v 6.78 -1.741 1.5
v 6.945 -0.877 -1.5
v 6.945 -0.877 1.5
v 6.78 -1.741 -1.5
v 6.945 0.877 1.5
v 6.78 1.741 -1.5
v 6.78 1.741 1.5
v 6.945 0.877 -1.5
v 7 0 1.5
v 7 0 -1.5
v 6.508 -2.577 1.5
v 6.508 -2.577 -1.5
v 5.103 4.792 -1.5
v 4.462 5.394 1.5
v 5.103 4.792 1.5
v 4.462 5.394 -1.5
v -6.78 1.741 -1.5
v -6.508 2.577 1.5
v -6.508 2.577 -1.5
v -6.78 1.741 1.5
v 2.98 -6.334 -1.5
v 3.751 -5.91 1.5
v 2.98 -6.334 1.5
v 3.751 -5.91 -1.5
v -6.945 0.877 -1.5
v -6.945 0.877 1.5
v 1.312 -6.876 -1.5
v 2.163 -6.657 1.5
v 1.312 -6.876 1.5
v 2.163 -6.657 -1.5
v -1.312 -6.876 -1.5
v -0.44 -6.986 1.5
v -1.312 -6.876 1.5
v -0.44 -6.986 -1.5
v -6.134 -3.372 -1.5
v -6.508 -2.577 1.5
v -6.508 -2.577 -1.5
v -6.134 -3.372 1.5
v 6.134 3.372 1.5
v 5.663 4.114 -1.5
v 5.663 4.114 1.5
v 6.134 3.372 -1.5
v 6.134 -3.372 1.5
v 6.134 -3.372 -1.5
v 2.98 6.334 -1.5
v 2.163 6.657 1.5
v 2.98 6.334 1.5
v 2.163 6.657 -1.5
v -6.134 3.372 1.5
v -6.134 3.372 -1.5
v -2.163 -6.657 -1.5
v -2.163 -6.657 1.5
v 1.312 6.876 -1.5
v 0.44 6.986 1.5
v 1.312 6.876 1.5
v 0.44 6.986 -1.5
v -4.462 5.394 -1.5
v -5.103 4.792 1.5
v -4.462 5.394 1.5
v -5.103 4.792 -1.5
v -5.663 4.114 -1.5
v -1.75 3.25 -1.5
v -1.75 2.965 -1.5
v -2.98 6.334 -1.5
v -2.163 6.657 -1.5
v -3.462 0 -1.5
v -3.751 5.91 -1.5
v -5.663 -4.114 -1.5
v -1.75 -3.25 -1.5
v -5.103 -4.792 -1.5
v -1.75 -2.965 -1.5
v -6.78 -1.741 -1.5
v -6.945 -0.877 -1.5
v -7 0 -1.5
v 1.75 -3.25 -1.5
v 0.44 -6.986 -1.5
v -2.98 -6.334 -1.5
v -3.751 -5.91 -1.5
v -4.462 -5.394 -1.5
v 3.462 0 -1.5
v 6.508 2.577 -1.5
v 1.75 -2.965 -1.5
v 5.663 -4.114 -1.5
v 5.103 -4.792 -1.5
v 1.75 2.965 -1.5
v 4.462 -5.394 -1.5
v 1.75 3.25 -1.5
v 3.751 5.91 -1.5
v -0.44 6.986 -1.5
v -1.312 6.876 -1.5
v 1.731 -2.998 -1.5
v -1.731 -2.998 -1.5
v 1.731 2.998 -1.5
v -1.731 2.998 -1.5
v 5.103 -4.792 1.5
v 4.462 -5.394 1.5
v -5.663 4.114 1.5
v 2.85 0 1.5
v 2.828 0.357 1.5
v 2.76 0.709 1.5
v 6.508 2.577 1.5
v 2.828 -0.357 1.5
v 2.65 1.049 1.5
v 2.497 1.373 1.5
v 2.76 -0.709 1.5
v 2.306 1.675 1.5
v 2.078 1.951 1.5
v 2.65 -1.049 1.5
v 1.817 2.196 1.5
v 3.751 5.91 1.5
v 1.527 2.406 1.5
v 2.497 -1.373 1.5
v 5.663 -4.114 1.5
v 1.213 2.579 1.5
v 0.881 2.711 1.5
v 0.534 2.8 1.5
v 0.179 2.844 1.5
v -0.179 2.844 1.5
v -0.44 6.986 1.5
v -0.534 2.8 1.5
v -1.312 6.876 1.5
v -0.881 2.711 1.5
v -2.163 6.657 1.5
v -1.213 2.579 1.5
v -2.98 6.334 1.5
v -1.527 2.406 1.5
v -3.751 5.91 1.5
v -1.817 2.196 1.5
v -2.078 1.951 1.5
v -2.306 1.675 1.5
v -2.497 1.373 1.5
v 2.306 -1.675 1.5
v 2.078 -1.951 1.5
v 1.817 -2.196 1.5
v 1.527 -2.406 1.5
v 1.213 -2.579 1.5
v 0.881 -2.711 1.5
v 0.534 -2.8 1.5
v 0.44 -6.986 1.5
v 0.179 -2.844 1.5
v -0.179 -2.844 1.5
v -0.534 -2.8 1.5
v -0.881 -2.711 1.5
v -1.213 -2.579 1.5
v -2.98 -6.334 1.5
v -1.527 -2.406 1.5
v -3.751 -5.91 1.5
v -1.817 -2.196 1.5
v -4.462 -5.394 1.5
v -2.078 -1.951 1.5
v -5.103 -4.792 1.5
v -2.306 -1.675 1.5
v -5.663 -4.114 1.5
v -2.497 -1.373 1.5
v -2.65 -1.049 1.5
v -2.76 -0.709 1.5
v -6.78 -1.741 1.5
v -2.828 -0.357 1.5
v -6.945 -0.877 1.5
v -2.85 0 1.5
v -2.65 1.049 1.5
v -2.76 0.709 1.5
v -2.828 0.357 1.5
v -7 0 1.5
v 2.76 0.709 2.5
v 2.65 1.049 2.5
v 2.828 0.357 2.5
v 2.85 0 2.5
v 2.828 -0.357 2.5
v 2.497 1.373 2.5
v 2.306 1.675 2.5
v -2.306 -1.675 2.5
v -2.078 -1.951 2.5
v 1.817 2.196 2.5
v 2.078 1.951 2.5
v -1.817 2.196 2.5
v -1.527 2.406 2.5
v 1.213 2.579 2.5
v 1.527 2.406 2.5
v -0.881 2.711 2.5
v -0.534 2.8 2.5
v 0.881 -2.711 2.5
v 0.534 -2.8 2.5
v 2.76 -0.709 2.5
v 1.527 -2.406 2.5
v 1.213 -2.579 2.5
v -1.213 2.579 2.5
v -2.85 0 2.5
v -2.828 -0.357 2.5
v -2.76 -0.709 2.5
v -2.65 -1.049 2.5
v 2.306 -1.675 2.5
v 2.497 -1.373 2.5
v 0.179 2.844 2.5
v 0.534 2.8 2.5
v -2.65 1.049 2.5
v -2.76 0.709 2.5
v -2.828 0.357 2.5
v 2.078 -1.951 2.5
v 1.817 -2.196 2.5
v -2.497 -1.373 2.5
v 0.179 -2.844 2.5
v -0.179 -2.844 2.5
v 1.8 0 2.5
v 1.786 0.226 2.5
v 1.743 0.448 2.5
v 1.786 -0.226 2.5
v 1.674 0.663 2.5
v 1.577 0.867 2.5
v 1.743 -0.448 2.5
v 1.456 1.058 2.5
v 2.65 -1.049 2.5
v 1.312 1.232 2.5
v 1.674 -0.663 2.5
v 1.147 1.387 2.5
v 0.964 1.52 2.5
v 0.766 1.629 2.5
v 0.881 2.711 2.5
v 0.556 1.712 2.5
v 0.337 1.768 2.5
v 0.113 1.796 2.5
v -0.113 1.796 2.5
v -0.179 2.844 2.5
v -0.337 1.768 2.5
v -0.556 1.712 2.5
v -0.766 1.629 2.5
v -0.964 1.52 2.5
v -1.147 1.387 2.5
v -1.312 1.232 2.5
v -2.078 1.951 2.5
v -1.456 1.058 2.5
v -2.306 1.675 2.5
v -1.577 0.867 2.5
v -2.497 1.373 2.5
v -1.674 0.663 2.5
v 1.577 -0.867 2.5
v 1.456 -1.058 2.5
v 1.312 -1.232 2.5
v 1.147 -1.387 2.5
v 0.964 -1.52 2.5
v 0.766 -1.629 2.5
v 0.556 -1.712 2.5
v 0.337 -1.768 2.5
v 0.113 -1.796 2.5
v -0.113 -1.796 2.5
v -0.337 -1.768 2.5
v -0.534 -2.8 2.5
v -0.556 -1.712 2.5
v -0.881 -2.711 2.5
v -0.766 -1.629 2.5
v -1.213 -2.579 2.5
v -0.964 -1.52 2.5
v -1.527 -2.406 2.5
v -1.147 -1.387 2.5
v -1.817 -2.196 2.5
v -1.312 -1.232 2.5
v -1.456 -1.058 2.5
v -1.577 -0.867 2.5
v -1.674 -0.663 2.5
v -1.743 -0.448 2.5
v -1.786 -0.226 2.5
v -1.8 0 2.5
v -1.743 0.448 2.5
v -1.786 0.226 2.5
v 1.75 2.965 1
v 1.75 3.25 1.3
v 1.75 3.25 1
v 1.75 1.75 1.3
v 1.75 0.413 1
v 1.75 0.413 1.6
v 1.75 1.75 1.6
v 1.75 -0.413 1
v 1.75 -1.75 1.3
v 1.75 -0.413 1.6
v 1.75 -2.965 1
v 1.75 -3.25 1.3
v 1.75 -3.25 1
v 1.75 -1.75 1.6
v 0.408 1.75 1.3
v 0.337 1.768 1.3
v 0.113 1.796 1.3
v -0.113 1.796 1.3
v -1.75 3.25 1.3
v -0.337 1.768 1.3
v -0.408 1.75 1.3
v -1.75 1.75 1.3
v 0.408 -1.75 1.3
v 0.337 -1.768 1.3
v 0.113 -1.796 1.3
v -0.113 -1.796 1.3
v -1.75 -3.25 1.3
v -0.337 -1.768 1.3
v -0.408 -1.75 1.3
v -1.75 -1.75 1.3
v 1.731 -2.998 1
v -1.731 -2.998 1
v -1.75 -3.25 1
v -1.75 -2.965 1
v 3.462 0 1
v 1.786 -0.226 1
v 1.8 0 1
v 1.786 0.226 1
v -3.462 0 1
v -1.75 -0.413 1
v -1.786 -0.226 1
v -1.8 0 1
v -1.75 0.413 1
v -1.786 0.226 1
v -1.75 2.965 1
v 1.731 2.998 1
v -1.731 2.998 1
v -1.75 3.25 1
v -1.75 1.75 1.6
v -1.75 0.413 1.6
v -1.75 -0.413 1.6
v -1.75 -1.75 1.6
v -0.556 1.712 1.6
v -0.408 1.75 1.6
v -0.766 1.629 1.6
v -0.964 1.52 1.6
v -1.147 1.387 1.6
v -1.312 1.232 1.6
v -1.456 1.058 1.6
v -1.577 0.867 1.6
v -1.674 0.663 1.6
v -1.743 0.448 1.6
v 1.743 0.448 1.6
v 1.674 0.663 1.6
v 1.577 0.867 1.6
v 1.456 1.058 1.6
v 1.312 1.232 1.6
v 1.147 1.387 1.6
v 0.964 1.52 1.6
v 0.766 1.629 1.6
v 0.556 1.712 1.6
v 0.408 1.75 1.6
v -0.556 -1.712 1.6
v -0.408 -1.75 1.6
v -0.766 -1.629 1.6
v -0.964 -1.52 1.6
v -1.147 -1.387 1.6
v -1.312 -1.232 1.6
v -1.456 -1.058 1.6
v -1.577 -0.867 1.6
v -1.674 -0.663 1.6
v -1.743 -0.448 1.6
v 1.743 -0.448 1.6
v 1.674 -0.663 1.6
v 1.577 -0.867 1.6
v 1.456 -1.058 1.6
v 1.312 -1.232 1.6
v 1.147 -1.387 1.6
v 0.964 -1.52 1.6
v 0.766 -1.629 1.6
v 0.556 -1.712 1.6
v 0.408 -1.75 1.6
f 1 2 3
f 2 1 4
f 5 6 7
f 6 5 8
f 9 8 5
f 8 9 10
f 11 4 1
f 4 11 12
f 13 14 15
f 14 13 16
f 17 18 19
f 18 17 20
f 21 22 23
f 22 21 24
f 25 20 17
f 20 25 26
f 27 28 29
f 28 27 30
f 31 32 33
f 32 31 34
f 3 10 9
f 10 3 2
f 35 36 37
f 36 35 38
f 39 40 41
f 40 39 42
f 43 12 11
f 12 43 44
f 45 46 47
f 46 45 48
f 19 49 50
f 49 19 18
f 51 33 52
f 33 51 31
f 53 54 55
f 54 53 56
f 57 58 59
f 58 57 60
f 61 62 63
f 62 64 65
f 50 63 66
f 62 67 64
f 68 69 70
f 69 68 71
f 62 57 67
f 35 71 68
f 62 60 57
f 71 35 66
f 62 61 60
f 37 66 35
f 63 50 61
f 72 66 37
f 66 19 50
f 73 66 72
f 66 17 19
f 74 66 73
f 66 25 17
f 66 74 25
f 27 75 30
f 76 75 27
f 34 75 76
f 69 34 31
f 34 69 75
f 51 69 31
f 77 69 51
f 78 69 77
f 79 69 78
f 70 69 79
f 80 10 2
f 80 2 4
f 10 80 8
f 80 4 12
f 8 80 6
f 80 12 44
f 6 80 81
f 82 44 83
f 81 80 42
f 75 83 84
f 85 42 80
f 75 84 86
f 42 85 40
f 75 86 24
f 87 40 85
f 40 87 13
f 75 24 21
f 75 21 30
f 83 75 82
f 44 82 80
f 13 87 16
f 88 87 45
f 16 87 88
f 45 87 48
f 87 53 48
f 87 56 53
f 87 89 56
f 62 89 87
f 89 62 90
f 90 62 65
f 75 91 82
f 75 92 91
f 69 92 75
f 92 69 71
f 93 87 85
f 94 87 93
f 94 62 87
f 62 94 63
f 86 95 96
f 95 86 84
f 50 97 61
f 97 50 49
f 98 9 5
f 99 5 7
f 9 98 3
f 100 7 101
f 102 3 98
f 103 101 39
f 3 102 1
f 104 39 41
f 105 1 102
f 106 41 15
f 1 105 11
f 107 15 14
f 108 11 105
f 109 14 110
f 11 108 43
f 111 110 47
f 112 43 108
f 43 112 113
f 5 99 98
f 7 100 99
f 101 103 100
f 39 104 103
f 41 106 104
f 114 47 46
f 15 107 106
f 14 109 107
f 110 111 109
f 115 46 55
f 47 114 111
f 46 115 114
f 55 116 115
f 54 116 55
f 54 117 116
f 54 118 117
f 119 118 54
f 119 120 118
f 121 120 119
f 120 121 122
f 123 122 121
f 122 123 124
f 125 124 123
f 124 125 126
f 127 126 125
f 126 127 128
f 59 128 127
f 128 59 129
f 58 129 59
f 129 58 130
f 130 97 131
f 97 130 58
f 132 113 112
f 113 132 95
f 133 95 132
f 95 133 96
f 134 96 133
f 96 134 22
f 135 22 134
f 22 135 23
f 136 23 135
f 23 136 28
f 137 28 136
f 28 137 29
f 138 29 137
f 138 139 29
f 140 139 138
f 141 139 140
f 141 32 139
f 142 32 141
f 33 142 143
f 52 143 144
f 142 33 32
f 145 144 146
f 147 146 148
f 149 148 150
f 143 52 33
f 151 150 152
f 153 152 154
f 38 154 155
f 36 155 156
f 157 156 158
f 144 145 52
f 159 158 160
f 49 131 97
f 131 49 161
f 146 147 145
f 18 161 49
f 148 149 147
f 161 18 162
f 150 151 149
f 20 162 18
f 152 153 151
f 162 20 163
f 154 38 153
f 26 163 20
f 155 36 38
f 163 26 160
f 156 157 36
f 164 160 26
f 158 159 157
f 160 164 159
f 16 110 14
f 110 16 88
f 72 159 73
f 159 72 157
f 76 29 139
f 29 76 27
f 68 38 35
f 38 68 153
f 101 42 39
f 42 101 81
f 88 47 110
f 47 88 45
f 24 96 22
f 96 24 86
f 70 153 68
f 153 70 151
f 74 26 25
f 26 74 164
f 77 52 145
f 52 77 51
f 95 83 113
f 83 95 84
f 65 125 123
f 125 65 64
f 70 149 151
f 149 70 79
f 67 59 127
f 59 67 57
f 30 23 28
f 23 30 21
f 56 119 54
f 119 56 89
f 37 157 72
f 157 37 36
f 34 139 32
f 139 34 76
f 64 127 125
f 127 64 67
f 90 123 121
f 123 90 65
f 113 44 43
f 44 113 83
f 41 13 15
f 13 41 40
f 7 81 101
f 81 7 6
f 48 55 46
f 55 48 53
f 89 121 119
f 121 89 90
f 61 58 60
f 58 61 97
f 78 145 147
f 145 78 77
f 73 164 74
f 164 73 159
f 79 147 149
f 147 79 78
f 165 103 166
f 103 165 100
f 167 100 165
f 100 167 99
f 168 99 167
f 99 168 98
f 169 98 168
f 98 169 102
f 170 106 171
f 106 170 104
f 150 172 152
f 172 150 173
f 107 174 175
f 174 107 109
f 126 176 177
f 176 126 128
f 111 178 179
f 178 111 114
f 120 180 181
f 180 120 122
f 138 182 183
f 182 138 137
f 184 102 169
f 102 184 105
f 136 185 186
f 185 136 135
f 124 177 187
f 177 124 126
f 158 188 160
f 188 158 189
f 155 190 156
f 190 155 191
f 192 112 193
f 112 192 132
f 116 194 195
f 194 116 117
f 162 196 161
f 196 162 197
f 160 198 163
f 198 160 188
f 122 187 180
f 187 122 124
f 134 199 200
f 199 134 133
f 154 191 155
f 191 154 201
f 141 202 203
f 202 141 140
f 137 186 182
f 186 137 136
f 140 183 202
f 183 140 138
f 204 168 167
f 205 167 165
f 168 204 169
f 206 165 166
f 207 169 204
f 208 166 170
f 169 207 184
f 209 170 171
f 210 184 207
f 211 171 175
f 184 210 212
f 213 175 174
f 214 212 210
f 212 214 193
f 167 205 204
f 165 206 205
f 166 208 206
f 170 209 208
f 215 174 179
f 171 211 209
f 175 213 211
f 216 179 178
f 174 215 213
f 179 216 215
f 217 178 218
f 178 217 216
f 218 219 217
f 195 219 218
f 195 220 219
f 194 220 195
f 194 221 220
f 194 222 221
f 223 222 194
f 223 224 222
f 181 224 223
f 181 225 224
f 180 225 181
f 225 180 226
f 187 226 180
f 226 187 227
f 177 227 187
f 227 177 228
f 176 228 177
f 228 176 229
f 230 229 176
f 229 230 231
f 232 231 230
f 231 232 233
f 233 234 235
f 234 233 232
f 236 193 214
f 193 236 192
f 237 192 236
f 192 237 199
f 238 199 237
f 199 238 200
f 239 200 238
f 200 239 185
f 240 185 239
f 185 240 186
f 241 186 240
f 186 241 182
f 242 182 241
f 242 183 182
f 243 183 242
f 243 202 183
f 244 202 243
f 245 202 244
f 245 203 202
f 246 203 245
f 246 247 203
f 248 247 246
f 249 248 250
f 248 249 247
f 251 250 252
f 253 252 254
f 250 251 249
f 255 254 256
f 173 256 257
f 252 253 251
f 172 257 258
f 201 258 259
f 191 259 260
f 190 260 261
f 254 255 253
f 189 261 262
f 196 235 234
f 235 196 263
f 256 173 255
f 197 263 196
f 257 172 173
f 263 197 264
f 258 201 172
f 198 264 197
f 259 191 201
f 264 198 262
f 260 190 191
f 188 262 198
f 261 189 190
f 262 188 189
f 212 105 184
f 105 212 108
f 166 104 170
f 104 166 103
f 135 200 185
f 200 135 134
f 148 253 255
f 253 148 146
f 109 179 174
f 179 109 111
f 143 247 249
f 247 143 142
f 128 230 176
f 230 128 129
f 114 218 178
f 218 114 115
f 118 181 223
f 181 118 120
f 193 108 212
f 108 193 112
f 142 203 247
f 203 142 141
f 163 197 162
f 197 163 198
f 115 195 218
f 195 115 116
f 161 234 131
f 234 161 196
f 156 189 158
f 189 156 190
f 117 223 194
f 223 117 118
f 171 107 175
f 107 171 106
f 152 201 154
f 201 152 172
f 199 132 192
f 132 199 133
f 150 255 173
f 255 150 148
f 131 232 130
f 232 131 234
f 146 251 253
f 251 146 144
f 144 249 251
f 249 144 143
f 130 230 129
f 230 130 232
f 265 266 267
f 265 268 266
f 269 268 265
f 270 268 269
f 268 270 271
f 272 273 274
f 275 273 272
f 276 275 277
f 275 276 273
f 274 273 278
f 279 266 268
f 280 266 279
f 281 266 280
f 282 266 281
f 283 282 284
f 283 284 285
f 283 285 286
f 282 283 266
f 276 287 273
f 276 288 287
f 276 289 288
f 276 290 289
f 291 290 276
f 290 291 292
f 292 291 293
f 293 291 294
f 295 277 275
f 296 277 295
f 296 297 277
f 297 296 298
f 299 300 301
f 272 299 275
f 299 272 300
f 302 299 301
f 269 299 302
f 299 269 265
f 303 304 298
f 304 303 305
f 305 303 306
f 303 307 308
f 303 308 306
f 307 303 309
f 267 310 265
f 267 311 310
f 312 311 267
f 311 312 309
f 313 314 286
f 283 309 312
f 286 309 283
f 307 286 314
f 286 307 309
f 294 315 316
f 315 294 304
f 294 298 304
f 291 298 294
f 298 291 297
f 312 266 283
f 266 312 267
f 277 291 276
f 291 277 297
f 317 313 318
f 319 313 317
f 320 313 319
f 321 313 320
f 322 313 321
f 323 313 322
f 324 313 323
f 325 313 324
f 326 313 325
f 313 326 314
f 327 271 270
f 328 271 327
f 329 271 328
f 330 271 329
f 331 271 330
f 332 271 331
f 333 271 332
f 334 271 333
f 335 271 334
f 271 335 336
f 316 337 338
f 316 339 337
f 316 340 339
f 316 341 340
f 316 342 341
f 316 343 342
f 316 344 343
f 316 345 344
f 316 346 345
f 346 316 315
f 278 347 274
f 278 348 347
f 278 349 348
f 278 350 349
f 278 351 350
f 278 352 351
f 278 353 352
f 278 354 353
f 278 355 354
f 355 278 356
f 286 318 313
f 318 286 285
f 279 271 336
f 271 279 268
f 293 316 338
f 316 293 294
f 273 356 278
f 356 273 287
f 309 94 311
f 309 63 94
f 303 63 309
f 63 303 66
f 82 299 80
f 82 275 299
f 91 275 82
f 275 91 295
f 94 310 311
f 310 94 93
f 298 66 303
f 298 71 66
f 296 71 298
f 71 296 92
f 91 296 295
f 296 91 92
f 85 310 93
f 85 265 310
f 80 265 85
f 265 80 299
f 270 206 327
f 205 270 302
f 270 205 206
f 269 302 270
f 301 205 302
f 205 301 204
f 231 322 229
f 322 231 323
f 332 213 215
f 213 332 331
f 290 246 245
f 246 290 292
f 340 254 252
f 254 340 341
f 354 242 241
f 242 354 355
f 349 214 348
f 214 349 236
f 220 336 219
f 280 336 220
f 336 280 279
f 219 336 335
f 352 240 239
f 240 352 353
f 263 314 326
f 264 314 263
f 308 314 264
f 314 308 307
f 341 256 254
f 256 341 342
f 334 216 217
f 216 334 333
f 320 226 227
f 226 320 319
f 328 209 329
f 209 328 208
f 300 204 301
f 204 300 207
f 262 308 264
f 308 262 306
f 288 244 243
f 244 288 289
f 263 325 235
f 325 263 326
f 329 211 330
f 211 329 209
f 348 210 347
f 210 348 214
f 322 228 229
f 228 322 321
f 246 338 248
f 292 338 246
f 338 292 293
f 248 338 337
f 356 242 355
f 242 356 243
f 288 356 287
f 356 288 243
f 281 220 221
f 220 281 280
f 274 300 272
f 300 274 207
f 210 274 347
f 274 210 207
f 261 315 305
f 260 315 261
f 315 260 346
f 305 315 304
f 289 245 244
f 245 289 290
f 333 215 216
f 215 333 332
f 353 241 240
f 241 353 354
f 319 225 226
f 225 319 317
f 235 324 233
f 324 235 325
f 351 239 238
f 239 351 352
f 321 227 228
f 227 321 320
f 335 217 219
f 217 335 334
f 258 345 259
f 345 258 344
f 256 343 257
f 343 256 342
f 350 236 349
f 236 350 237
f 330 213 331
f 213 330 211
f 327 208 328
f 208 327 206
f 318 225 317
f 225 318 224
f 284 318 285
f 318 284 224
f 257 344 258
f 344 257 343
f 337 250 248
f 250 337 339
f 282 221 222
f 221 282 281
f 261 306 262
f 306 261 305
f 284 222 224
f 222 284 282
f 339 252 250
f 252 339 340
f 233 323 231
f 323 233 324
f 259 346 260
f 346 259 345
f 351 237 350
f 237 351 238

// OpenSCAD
$fn = 50;


difference() {
	union() {
		translate(v = [0, 0, -1.5000000000]) {
			cylinder(h = 3, r = 7.0000000000);
		}
		translate(v = [0, 0, -1.5000000000]) {
			cylinder(h = 4, r = 2.8500000000);
		}
	}
	union() {
		translate(v = [0, 0, -1.5000000000]) {
			rotate(a = [0, 0, 0]) {
				difference() {
					union() {
						translate(v = [-1.7500000000, -3.2500000000, -0.3000000000]) {
							cube(size = [3.5000000000, 6.5000000000, 0.3000000000]);
						}
						translate(v = [-1.7500000000, -1.7500000000, -0.6000000000]) {
							cube(size = [3.5000000000, 3.5000000000, 0.3000000000]);
						}
						translate(v = [-1.7500000000, -3.2500000000, 2.5000000000]) {
							cube(size = [3.5000000000, 6.5000000000, 0.3000000000]);
						}
						translate(v = [-1.7500000000, -1.7500000000, 2.8000000000]) {
							cube(size = [3.5000000000, 3.5000000000, 0.3000000000]);
						}
						linear_extrude(height = 2.5000000000) {
							polygon(points = [[3.4620000000, 0.0000000000], [1.7310000000, 2.9981799479], [-1.7310000000, 2.9981799479], [-3.4620000000, 0.0000000000], [-1.7310000000, -2.9981799479], [1.7310000000, -2.9981799479]]);
						}
						translate(v = [-1.7500000000, -3.2500000000, -0.3000000000]) {
							cube(size = [3.5000000000, 6.5000000000, 0.3000000000]);
						}
						translate(v = [-1.7500000000, -1.7500000000, -0.6000000000]) {
							cube(size = [3.5000000000, 3.5000000000, 0.3000000000]);
						}
						translate(v = [-1.7500000000, -3.2500000000, 2.5000000000]) {
							cube(size = [3.5000000000, 6.5000000000, 0.3000000000]);
						}
						translate(v = [-1.7500000000, -1.7500000000, 2.8000000000]) {
							cube(size = [3.5000000000, 3.5000000000, 0.3000000000]);
						}
						translate(v = [-1.7500000000, -3.2500000000, -0.3000000000]) {
							cube(size = [3.5000000000, 6.5000000000, 0.3000000000]);
						}
						translate(v = [-1.7500000000, -1.7500000000, -0.6000000000]) {
							cube(size = [3.5000000000, 3.5000000000, 0.3000000000]);
						}
						translate(v = [-1.7500000000, -3.2500000000, 2.5000000000]) {
							cube(size = [3.5000000000, 6.5000000000, 0.3000000000]);
						}
						translate(v = [-1.7500000000, -1.7500000000, 2.8000000000]) {
							cube(size = [3.5000000000, 3.5000000000, 0.3000000000]);
						}
					}
					union();
				}
			}
		}
		translate(v = [0, 0, -100.0000000000]) {
			cylinder(h = 200, r = 1.8000000000);
		}
	}
}
